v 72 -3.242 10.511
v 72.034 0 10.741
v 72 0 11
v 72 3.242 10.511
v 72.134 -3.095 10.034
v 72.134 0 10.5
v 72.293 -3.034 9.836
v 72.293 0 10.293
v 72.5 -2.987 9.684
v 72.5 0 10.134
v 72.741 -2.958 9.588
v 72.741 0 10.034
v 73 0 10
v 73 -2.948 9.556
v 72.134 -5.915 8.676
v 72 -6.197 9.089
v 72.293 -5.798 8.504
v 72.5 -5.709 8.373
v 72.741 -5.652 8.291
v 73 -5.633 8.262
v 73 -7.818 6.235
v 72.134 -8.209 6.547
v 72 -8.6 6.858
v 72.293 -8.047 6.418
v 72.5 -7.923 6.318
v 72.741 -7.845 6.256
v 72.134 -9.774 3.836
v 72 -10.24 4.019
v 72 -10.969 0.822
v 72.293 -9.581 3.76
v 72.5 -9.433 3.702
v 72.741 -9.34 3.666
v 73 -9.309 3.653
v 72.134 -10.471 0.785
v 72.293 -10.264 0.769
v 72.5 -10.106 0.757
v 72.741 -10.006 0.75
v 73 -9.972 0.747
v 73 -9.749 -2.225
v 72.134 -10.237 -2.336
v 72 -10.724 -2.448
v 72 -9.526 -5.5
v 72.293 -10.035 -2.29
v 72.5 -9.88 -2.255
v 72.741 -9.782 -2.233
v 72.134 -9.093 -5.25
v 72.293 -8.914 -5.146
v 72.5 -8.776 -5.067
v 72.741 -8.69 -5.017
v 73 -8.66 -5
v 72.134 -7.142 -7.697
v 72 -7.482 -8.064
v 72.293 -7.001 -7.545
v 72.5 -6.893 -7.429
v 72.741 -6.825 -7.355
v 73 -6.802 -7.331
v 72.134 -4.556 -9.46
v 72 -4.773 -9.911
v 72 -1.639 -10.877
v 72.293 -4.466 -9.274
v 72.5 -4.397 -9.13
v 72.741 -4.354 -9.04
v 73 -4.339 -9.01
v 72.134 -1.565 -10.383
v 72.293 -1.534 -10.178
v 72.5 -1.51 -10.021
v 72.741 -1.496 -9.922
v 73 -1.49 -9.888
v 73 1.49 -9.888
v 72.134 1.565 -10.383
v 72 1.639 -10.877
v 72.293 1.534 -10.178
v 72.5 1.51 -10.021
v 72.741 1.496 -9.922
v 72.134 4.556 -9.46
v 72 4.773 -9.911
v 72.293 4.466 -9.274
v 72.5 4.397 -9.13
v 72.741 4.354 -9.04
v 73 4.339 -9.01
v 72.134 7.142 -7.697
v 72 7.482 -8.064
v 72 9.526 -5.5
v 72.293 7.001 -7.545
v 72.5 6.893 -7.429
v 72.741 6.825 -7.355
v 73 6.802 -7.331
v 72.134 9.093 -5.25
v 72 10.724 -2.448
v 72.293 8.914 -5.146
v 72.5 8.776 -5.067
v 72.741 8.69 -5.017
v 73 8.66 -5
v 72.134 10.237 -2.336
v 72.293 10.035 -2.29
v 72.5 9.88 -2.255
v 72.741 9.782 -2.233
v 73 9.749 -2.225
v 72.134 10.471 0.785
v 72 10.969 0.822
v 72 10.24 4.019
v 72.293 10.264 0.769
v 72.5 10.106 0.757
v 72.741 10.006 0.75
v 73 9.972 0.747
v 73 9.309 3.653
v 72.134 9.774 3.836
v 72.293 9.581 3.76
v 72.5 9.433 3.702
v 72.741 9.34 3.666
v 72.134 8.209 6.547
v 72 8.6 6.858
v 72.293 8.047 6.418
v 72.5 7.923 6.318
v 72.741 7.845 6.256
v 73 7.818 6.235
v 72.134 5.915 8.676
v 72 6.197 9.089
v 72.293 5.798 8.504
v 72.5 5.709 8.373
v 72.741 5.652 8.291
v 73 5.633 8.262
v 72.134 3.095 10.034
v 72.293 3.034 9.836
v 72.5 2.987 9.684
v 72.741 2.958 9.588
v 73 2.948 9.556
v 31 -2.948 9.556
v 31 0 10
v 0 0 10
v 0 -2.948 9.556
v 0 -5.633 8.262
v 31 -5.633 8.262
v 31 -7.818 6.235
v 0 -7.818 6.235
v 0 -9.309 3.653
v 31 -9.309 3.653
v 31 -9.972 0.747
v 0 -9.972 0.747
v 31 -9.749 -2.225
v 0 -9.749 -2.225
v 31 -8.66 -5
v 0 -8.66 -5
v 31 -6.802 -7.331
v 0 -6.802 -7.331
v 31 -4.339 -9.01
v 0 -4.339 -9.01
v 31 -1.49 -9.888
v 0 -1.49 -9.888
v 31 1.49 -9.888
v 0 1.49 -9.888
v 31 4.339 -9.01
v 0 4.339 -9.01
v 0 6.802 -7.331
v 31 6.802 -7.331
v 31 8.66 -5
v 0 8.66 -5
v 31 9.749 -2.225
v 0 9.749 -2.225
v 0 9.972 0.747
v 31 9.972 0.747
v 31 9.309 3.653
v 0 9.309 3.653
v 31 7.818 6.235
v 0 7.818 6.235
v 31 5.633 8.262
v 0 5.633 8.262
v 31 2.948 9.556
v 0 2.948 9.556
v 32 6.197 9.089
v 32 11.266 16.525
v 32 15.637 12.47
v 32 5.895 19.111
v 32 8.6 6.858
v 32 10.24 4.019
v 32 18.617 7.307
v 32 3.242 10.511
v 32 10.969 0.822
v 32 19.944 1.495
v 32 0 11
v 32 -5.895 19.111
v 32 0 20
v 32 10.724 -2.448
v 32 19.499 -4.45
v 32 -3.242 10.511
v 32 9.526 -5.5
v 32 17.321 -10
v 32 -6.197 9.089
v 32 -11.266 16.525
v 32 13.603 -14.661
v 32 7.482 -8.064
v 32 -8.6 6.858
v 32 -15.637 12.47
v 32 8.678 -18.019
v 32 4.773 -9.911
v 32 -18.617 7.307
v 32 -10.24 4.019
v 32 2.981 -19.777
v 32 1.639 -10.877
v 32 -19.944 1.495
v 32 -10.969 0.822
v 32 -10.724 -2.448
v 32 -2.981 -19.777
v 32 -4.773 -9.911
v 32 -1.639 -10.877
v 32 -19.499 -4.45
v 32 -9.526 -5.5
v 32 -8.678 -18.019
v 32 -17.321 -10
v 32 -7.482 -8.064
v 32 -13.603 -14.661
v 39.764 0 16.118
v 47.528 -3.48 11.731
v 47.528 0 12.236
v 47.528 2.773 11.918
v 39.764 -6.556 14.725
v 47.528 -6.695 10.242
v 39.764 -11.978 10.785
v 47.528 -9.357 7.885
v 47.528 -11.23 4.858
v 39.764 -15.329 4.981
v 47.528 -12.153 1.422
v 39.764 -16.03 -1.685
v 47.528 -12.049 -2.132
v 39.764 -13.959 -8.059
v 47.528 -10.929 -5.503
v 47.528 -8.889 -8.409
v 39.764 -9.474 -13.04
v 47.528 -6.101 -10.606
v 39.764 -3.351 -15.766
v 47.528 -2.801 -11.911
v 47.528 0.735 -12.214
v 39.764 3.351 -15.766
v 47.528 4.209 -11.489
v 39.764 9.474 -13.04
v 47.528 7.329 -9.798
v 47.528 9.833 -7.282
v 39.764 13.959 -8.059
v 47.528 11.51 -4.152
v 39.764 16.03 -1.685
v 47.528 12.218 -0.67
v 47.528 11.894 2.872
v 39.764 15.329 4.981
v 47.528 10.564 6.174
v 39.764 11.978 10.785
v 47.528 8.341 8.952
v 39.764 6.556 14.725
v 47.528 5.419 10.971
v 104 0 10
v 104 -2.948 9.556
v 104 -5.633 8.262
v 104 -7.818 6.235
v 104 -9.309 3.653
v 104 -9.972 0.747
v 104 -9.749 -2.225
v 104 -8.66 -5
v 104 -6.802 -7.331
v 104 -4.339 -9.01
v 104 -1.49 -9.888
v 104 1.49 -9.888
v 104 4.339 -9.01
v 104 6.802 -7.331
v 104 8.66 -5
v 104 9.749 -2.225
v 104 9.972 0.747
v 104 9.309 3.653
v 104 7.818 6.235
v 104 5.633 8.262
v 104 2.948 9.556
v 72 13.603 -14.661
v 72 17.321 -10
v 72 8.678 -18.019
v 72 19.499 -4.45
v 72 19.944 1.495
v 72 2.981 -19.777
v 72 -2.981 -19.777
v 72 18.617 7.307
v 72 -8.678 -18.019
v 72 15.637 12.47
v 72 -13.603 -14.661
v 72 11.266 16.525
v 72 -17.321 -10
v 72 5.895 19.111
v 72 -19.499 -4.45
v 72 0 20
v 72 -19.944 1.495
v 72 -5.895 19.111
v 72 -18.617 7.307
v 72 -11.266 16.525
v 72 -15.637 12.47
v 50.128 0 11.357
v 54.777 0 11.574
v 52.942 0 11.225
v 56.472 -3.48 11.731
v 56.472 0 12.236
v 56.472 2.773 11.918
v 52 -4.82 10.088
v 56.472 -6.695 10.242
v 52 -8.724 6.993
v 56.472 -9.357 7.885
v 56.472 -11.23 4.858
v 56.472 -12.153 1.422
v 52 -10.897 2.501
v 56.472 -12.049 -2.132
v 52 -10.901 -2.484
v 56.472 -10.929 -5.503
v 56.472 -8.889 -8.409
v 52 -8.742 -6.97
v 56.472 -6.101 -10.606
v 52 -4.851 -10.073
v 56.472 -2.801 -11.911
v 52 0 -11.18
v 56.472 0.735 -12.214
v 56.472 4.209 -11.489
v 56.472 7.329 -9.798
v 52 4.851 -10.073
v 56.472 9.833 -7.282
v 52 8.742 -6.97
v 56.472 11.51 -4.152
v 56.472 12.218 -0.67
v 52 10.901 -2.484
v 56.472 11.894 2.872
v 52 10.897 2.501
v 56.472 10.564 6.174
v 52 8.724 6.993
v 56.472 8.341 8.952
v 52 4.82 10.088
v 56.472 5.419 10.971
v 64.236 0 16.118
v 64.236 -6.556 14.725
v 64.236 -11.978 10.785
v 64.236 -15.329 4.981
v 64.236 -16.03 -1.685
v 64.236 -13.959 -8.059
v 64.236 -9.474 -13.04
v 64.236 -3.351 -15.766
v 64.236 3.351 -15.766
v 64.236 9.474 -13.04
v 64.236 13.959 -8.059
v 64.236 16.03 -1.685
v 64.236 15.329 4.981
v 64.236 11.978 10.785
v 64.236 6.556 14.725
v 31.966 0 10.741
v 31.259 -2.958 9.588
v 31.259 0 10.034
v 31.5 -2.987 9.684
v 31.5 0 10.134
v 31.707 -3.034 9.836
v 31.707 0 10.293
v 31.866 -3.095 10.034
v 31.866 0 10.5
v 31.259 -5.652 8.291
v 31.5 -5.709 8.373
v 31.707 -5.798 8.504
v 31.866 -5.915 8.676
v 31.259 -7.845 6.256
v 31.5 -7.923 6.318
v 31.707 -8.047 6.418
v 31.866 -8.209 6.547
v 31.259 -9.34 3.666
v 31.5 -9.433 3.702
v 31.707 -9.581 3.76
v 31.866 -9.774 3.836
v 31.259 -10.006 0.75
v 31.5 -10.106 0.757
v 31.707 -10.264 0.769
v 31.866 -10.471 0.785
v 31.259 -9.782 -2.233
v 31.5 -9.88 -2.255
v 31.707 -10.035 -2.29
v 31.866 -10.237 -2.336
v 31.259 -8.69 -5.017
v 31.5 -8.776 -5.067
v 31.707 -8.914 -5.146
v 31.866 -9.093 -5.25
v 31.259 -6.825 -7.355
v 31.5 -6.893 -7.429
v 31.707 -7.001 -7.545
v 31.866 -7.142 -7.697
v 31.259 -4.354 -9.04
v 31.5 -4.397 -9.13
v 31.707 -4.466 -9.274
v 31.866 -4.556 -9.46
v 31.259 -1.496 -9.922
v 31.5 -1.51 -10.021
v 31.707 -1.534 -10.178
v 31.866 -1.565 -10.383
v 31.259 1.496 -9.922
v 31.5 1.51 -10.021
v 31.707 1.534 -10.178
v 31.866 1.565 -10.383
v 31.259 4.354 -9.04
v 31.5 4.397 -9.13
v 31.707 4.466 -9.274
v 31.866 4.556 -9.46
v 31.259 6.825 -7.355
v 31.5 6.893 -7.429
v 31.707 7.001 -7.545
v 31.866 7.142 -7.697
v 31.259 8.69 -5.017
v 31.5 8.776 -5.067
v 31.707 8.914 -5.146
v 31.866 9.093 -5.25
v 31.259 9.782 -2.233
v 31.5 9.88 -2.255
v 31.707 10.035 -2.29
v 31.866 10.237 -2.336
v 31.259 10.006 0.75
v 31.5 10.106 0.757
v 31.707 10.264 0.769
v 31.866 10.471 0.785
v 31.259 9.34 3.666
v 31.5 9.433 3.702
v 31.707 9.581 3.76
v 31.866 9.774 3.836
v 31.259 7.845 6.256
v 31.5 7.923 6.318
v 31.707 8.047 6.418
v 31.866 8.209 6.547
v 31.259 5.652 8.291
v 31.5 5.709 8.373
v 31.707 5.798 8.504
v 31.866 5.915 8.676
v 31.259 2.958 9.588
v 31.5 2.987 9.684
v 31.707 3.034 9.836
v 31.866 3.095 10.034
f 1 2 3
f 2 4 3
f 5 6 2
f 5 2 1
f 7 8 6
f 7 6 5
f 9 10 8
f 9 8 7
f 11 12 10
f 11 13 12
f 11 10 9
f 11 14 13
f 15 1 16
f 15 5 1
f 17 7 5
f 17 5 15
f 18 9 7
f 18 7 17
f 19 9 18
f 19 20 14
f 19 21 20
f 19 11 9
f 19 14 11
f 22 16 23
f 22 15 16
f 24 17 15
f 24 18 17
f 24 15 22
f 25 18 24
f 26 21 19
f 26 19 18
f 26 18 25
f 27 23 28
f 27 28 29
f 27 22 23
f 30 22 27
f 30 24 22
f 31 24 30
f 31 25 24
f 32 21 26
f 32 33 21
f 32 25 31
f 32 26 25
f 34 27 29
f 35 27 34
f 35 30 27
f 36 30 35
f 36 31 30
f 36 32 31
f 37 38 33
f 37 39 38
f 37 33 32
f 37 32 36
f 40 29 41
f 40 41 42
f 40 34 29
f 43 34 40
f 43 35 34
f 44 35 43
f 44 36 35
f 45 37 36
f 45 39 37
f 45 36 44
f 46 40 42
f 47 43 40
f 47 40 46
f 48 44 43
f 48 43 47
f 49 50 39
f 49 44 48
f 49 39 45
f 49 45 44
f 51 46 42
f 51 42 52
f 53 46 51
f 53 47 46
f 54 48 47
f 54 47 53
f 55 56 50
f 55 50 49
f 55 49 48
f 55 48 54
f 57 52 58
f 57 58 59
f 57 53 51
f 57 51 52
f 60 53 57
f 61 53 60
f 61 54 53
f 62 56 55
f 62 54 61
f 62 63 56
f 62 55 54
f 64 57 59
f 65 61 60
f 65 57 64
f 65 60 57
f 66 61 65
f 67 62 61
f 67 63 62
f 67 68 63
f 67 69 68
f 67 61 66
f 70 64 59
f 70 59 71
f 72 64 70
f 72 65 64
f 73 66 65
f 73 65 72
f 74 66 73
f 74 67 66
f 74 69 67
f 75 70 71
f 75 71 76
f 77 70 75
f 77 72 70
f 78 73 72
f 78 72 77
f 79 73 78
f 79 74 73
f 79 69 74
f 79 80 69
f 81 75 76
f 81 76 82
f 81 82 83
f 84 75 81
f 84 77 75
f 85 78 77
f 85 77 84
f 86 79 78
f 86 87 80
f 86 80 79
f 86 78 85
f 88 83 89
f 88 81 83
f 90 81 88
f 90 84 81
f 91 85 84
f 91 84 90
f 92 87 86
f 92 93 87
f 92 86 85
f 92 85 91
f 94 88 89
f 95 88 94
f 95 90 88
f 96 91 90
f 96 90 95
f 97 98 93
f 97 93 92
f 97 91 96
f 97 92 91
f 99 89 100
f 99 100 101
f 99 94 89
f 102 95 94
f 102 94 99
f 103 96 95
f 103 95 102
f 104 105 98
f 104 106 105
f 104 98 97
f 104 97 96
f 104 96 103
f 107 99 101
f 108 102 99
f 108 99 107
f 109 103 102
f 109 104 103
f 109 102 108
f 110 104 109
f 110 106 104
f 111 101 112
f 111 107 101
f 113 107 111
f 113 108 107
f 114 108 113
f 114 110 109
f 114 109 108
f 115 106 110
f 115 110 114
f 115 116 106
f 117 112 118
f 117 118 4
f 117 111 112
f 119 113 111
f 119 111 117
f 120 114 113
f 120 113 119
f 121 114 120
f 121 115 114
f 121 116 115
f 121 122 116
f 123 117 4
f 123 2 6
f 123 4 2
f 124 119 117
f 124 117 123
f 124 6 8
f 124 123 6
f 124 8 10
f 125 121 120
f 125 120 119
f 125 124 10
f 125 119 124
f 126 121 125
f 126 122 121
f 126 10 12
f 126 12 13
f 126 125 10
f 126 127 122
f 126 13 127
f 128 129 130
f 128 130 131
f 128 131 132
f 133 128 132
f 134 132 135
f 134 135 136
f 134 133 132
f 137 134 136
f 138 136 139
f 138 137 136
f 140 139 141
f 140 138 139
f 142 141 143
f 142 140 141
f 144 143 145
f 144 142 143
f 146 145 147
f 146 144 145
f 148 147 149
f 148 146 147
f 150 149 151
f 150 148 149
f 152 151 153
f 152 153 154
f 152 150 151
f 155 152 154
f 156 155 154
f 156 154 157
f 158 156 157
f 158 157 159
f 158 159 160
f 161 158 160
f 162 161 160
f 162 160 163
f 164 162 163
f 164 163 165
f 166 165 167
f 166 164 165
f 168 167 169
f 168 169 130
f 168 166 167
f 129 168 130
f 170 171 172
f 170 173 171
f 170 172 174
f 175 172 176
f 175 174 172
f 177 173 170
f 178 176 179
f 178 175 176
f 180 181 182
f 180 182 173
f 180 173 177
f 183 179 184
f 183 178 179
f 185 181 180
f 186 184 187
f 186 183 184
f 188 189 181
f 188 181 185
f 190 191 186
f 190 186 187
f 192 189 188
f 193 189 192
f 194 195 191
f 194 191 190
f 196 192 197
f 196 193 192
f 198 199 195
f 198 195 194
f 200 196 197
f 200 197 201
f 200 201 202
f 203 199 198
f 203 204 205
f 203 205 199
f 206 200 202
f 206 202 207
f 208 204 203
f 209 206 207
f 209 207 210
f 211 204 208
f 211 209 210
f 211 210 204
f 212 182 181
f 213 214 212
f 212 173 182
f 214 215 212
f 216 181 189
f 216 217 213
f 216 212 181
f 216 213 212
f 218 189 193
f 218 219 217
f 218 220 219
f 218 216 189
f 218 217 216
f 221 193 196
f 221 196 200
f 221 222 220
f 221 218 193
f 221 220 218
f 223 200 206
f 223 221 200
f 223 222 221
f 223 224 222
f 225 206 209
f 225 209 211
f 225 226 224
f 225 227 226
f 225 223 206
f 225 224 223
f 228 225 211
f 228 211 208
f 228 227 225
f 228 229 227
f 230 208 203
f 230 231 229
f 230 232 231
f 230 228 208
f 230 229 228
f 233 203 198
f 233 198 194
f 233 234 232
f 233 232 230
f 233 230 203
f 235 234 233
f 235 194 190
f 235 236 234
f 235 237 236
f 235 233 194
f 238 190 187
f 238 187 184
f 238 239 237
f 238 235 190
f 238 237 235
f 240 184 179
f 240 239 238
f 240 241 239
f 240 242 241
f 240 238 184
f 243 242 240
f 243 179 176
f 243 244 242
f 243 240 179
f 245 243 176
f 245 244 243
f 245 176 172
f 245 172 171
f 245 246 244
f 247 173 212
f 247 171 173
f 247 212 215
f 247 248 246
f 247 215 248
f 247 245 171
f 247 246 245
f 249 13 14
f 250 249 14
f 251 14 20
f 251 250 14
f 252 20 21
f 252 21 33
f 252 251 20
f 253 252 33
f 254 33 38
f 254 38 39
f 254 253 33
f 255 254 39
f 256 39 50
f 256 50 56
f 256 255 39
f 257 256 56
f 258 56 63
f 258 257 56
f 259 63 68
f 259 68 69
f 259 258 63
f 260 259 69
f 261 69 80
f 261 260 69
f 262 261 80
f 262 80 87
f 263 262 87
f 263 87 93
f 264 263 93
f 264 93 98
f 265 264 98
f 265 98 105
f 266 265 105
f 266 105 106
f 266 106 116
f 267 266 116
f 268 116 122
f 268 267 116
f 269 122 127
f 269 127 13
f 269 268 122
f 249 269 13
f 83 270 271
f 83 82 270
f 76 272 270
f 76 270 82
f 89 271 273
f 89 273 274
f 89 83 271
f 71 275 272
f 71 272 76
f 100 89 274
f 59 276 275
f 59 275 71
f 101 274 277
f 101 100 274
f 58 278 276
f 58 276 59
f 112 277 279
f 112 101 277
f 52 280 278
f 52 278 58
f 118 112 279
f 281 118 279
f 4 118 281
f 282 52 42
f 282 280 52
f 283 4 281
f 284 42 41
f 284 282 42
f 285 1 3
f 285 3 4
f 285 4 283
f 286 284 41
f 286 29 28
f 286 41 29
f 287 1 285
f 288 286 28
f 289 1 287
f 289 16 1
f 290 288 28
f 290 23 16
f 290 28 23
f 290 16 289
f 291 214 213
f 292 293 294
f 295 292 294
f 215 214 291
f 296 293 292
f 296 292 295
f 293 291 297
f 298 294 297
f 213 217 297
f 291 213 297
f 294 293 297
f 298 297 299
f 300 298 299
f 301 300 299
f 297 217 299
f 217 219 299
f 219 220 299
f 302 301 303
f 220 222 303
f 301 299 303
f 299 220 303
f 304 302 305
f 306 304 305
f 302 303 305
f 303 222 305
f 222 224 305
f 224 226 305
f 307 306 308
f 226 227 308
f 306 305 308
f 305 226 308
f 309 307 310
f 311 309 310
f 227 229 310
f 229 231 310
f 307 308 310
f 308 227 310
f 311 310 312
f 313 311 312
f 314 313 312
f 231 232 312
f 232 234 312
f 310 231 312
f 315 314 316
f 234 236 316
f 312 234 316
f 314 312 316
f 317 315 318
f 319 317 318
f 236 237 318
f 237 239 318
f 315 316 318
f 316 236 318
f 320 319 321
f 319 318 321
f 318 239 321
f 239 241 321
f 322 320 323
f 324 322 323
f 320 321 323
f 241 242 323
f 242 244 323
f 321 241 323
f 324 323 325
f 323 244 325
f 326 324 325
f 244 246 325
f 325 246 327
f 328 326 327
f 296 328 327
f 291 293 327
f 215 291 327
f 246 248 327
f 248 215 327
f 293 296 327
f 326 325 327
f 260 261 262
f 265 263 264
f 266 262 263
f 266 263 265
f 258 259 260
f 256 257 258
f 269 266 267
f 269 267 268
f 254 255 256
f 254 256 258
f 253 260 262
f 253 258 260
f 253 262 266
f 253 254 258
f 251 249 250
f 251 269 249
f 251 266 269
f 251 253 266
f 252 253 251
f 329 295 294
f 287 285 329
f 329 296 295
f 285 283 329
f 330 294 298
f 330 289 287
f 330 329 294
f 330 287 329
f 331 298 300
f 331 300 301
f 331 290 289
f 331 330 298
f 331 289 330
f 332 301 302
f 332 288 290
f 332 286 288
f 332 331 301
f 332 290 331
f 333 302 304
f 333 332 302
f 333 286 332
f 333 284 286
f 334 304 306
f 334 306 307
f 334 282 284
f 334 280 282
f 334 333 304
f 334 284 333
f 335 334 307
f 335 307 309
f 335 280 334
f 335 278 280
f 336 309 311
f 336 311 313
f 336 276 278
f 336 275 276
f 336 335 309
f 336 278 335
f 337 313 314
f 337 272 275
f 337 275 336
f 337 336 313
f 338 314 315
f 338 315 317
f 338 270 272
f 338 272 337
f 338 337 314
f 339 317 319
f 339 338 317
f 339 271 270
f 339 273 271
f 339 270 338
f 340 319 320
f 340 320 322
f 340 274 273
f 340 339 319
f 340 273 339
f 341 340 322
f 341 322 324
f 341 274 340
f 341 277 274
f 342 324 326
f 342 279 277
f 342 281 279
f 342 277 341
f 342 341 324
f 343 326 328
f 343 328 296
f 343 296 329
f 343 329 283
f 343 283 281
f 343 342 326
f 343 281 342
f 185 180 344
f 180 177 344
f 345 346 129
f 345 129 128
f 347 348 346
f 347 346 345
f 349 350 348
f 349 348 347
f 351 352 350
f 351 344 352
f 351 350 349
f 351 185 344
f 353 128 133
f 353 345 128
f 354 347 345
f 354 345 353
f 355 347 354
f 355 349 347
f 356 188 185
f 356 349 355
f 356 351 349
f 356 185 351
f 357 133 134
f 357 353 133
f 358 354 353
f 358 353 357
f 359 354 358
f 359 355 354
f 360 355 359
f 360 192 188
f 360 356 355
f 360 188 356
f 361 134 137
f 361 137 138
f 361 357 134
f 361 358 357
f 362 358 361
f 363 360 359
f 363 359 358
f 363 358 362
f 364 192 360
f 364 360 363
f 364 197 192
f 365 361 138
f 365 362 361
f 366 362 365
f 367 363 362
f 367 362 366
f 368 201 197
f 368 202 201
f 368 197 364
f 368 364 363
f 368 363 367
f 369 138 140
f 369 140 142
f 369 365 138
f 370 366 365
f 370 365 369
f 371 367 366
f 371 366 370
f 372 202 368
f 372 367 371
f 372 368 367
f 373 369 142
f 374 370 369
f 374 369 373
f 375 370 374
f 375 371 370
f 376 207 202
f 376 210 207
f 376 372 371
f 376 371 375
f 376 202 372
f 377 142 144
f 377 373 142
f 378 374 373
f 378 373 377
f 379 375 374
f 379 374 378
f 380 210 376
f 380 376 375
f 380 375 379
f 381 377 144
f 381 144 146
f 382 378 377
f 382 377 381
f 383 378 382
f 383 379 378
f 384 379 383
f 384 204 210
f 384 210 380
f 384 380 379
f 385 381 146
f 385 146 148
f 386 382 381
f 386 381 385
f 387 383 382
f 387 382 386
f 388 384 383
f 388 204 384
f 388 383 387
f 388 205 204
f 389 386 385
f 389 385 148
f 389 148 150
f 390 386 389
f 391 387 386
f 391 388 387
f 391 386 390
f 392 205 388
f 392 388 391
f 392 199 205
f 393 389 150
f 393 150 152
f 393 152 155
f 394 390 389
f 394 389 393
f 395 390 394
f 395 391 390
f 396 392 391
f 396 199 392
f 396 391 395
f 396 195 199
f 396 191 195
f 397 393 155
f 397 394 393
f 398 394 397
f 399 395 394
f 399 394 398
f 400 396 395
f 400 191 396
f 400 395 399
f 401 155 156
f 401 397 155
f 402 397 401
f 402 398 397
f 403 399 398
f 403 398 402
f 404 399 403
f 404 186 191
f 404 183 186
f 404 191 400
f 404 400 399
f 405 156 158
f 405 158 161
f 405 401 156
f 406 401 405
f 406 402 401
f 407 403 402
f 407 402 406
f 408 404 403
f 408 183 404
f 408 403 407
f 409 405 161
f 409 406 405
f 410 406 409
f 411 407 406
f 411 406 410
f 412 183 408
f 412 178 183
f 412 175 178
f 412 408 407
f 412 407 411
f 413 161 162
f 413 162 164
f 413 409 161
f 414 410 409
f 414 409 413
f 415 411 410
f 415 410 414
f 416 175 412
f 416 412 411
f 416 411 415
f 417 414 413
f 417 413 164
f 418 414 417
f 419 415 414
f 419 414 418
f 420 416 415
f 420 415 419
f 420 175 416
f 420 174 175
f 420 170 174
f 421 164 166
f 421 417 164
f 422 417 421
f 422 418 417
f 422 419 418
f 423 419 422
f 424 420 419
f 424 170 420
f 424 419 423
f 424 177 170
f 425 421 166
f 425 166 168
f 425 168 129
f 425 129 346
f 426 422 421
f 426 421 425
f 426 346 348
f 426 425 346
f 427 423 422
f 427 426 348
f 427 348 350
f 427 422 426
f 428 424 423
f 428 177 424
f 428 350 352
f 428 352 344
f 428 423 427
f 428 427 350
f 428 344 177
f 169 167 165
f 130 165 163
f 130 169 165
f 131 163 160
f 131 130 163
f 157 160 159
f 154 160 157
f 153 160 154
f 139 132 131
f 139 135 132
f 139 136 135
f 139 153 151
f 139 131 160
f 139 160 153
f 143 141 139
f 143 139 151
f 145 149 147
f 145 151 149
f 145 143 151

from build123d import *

# Parameters (mm, degrees)
FILLET1_R = 1
FILLET2_R = 10


with BuildPart() as part:
    # Sketch1 → Revolve1 (revolve)
    with BuildSketch(Plane.XY, mode=Mode.PRIVATE) as revolve1_sk:
        Polygon((0, 0), (0, 10), (32, 10), (32, 20), (52, 10), (72, 20), (72, 10), (104, 10), (104, 0), align=None)
    revolve(revolve1_sk.sketch.rotate(Axis((0, 0, 0), (1, 0, 0)), 90), axis=Axis((0, 0, 0), (1, 0, 0)))

    # Fillet1
    fillet1_edges = [part.edges().sort_by_distance(p)[0] for p in [
        (32, 0, -10),
        (72, 0, -10),
    ]]
    fillet(fillet1_edges, radius=FILLET1_R)

    # Fillet2
    fillet2_edges = [part.edges().sort_by_distance(p)[0] for p in [
        (52, 0, -10),
    ]]
    fillet(fillet2_edges, radius=FILLET2_R)


solid = part.part
